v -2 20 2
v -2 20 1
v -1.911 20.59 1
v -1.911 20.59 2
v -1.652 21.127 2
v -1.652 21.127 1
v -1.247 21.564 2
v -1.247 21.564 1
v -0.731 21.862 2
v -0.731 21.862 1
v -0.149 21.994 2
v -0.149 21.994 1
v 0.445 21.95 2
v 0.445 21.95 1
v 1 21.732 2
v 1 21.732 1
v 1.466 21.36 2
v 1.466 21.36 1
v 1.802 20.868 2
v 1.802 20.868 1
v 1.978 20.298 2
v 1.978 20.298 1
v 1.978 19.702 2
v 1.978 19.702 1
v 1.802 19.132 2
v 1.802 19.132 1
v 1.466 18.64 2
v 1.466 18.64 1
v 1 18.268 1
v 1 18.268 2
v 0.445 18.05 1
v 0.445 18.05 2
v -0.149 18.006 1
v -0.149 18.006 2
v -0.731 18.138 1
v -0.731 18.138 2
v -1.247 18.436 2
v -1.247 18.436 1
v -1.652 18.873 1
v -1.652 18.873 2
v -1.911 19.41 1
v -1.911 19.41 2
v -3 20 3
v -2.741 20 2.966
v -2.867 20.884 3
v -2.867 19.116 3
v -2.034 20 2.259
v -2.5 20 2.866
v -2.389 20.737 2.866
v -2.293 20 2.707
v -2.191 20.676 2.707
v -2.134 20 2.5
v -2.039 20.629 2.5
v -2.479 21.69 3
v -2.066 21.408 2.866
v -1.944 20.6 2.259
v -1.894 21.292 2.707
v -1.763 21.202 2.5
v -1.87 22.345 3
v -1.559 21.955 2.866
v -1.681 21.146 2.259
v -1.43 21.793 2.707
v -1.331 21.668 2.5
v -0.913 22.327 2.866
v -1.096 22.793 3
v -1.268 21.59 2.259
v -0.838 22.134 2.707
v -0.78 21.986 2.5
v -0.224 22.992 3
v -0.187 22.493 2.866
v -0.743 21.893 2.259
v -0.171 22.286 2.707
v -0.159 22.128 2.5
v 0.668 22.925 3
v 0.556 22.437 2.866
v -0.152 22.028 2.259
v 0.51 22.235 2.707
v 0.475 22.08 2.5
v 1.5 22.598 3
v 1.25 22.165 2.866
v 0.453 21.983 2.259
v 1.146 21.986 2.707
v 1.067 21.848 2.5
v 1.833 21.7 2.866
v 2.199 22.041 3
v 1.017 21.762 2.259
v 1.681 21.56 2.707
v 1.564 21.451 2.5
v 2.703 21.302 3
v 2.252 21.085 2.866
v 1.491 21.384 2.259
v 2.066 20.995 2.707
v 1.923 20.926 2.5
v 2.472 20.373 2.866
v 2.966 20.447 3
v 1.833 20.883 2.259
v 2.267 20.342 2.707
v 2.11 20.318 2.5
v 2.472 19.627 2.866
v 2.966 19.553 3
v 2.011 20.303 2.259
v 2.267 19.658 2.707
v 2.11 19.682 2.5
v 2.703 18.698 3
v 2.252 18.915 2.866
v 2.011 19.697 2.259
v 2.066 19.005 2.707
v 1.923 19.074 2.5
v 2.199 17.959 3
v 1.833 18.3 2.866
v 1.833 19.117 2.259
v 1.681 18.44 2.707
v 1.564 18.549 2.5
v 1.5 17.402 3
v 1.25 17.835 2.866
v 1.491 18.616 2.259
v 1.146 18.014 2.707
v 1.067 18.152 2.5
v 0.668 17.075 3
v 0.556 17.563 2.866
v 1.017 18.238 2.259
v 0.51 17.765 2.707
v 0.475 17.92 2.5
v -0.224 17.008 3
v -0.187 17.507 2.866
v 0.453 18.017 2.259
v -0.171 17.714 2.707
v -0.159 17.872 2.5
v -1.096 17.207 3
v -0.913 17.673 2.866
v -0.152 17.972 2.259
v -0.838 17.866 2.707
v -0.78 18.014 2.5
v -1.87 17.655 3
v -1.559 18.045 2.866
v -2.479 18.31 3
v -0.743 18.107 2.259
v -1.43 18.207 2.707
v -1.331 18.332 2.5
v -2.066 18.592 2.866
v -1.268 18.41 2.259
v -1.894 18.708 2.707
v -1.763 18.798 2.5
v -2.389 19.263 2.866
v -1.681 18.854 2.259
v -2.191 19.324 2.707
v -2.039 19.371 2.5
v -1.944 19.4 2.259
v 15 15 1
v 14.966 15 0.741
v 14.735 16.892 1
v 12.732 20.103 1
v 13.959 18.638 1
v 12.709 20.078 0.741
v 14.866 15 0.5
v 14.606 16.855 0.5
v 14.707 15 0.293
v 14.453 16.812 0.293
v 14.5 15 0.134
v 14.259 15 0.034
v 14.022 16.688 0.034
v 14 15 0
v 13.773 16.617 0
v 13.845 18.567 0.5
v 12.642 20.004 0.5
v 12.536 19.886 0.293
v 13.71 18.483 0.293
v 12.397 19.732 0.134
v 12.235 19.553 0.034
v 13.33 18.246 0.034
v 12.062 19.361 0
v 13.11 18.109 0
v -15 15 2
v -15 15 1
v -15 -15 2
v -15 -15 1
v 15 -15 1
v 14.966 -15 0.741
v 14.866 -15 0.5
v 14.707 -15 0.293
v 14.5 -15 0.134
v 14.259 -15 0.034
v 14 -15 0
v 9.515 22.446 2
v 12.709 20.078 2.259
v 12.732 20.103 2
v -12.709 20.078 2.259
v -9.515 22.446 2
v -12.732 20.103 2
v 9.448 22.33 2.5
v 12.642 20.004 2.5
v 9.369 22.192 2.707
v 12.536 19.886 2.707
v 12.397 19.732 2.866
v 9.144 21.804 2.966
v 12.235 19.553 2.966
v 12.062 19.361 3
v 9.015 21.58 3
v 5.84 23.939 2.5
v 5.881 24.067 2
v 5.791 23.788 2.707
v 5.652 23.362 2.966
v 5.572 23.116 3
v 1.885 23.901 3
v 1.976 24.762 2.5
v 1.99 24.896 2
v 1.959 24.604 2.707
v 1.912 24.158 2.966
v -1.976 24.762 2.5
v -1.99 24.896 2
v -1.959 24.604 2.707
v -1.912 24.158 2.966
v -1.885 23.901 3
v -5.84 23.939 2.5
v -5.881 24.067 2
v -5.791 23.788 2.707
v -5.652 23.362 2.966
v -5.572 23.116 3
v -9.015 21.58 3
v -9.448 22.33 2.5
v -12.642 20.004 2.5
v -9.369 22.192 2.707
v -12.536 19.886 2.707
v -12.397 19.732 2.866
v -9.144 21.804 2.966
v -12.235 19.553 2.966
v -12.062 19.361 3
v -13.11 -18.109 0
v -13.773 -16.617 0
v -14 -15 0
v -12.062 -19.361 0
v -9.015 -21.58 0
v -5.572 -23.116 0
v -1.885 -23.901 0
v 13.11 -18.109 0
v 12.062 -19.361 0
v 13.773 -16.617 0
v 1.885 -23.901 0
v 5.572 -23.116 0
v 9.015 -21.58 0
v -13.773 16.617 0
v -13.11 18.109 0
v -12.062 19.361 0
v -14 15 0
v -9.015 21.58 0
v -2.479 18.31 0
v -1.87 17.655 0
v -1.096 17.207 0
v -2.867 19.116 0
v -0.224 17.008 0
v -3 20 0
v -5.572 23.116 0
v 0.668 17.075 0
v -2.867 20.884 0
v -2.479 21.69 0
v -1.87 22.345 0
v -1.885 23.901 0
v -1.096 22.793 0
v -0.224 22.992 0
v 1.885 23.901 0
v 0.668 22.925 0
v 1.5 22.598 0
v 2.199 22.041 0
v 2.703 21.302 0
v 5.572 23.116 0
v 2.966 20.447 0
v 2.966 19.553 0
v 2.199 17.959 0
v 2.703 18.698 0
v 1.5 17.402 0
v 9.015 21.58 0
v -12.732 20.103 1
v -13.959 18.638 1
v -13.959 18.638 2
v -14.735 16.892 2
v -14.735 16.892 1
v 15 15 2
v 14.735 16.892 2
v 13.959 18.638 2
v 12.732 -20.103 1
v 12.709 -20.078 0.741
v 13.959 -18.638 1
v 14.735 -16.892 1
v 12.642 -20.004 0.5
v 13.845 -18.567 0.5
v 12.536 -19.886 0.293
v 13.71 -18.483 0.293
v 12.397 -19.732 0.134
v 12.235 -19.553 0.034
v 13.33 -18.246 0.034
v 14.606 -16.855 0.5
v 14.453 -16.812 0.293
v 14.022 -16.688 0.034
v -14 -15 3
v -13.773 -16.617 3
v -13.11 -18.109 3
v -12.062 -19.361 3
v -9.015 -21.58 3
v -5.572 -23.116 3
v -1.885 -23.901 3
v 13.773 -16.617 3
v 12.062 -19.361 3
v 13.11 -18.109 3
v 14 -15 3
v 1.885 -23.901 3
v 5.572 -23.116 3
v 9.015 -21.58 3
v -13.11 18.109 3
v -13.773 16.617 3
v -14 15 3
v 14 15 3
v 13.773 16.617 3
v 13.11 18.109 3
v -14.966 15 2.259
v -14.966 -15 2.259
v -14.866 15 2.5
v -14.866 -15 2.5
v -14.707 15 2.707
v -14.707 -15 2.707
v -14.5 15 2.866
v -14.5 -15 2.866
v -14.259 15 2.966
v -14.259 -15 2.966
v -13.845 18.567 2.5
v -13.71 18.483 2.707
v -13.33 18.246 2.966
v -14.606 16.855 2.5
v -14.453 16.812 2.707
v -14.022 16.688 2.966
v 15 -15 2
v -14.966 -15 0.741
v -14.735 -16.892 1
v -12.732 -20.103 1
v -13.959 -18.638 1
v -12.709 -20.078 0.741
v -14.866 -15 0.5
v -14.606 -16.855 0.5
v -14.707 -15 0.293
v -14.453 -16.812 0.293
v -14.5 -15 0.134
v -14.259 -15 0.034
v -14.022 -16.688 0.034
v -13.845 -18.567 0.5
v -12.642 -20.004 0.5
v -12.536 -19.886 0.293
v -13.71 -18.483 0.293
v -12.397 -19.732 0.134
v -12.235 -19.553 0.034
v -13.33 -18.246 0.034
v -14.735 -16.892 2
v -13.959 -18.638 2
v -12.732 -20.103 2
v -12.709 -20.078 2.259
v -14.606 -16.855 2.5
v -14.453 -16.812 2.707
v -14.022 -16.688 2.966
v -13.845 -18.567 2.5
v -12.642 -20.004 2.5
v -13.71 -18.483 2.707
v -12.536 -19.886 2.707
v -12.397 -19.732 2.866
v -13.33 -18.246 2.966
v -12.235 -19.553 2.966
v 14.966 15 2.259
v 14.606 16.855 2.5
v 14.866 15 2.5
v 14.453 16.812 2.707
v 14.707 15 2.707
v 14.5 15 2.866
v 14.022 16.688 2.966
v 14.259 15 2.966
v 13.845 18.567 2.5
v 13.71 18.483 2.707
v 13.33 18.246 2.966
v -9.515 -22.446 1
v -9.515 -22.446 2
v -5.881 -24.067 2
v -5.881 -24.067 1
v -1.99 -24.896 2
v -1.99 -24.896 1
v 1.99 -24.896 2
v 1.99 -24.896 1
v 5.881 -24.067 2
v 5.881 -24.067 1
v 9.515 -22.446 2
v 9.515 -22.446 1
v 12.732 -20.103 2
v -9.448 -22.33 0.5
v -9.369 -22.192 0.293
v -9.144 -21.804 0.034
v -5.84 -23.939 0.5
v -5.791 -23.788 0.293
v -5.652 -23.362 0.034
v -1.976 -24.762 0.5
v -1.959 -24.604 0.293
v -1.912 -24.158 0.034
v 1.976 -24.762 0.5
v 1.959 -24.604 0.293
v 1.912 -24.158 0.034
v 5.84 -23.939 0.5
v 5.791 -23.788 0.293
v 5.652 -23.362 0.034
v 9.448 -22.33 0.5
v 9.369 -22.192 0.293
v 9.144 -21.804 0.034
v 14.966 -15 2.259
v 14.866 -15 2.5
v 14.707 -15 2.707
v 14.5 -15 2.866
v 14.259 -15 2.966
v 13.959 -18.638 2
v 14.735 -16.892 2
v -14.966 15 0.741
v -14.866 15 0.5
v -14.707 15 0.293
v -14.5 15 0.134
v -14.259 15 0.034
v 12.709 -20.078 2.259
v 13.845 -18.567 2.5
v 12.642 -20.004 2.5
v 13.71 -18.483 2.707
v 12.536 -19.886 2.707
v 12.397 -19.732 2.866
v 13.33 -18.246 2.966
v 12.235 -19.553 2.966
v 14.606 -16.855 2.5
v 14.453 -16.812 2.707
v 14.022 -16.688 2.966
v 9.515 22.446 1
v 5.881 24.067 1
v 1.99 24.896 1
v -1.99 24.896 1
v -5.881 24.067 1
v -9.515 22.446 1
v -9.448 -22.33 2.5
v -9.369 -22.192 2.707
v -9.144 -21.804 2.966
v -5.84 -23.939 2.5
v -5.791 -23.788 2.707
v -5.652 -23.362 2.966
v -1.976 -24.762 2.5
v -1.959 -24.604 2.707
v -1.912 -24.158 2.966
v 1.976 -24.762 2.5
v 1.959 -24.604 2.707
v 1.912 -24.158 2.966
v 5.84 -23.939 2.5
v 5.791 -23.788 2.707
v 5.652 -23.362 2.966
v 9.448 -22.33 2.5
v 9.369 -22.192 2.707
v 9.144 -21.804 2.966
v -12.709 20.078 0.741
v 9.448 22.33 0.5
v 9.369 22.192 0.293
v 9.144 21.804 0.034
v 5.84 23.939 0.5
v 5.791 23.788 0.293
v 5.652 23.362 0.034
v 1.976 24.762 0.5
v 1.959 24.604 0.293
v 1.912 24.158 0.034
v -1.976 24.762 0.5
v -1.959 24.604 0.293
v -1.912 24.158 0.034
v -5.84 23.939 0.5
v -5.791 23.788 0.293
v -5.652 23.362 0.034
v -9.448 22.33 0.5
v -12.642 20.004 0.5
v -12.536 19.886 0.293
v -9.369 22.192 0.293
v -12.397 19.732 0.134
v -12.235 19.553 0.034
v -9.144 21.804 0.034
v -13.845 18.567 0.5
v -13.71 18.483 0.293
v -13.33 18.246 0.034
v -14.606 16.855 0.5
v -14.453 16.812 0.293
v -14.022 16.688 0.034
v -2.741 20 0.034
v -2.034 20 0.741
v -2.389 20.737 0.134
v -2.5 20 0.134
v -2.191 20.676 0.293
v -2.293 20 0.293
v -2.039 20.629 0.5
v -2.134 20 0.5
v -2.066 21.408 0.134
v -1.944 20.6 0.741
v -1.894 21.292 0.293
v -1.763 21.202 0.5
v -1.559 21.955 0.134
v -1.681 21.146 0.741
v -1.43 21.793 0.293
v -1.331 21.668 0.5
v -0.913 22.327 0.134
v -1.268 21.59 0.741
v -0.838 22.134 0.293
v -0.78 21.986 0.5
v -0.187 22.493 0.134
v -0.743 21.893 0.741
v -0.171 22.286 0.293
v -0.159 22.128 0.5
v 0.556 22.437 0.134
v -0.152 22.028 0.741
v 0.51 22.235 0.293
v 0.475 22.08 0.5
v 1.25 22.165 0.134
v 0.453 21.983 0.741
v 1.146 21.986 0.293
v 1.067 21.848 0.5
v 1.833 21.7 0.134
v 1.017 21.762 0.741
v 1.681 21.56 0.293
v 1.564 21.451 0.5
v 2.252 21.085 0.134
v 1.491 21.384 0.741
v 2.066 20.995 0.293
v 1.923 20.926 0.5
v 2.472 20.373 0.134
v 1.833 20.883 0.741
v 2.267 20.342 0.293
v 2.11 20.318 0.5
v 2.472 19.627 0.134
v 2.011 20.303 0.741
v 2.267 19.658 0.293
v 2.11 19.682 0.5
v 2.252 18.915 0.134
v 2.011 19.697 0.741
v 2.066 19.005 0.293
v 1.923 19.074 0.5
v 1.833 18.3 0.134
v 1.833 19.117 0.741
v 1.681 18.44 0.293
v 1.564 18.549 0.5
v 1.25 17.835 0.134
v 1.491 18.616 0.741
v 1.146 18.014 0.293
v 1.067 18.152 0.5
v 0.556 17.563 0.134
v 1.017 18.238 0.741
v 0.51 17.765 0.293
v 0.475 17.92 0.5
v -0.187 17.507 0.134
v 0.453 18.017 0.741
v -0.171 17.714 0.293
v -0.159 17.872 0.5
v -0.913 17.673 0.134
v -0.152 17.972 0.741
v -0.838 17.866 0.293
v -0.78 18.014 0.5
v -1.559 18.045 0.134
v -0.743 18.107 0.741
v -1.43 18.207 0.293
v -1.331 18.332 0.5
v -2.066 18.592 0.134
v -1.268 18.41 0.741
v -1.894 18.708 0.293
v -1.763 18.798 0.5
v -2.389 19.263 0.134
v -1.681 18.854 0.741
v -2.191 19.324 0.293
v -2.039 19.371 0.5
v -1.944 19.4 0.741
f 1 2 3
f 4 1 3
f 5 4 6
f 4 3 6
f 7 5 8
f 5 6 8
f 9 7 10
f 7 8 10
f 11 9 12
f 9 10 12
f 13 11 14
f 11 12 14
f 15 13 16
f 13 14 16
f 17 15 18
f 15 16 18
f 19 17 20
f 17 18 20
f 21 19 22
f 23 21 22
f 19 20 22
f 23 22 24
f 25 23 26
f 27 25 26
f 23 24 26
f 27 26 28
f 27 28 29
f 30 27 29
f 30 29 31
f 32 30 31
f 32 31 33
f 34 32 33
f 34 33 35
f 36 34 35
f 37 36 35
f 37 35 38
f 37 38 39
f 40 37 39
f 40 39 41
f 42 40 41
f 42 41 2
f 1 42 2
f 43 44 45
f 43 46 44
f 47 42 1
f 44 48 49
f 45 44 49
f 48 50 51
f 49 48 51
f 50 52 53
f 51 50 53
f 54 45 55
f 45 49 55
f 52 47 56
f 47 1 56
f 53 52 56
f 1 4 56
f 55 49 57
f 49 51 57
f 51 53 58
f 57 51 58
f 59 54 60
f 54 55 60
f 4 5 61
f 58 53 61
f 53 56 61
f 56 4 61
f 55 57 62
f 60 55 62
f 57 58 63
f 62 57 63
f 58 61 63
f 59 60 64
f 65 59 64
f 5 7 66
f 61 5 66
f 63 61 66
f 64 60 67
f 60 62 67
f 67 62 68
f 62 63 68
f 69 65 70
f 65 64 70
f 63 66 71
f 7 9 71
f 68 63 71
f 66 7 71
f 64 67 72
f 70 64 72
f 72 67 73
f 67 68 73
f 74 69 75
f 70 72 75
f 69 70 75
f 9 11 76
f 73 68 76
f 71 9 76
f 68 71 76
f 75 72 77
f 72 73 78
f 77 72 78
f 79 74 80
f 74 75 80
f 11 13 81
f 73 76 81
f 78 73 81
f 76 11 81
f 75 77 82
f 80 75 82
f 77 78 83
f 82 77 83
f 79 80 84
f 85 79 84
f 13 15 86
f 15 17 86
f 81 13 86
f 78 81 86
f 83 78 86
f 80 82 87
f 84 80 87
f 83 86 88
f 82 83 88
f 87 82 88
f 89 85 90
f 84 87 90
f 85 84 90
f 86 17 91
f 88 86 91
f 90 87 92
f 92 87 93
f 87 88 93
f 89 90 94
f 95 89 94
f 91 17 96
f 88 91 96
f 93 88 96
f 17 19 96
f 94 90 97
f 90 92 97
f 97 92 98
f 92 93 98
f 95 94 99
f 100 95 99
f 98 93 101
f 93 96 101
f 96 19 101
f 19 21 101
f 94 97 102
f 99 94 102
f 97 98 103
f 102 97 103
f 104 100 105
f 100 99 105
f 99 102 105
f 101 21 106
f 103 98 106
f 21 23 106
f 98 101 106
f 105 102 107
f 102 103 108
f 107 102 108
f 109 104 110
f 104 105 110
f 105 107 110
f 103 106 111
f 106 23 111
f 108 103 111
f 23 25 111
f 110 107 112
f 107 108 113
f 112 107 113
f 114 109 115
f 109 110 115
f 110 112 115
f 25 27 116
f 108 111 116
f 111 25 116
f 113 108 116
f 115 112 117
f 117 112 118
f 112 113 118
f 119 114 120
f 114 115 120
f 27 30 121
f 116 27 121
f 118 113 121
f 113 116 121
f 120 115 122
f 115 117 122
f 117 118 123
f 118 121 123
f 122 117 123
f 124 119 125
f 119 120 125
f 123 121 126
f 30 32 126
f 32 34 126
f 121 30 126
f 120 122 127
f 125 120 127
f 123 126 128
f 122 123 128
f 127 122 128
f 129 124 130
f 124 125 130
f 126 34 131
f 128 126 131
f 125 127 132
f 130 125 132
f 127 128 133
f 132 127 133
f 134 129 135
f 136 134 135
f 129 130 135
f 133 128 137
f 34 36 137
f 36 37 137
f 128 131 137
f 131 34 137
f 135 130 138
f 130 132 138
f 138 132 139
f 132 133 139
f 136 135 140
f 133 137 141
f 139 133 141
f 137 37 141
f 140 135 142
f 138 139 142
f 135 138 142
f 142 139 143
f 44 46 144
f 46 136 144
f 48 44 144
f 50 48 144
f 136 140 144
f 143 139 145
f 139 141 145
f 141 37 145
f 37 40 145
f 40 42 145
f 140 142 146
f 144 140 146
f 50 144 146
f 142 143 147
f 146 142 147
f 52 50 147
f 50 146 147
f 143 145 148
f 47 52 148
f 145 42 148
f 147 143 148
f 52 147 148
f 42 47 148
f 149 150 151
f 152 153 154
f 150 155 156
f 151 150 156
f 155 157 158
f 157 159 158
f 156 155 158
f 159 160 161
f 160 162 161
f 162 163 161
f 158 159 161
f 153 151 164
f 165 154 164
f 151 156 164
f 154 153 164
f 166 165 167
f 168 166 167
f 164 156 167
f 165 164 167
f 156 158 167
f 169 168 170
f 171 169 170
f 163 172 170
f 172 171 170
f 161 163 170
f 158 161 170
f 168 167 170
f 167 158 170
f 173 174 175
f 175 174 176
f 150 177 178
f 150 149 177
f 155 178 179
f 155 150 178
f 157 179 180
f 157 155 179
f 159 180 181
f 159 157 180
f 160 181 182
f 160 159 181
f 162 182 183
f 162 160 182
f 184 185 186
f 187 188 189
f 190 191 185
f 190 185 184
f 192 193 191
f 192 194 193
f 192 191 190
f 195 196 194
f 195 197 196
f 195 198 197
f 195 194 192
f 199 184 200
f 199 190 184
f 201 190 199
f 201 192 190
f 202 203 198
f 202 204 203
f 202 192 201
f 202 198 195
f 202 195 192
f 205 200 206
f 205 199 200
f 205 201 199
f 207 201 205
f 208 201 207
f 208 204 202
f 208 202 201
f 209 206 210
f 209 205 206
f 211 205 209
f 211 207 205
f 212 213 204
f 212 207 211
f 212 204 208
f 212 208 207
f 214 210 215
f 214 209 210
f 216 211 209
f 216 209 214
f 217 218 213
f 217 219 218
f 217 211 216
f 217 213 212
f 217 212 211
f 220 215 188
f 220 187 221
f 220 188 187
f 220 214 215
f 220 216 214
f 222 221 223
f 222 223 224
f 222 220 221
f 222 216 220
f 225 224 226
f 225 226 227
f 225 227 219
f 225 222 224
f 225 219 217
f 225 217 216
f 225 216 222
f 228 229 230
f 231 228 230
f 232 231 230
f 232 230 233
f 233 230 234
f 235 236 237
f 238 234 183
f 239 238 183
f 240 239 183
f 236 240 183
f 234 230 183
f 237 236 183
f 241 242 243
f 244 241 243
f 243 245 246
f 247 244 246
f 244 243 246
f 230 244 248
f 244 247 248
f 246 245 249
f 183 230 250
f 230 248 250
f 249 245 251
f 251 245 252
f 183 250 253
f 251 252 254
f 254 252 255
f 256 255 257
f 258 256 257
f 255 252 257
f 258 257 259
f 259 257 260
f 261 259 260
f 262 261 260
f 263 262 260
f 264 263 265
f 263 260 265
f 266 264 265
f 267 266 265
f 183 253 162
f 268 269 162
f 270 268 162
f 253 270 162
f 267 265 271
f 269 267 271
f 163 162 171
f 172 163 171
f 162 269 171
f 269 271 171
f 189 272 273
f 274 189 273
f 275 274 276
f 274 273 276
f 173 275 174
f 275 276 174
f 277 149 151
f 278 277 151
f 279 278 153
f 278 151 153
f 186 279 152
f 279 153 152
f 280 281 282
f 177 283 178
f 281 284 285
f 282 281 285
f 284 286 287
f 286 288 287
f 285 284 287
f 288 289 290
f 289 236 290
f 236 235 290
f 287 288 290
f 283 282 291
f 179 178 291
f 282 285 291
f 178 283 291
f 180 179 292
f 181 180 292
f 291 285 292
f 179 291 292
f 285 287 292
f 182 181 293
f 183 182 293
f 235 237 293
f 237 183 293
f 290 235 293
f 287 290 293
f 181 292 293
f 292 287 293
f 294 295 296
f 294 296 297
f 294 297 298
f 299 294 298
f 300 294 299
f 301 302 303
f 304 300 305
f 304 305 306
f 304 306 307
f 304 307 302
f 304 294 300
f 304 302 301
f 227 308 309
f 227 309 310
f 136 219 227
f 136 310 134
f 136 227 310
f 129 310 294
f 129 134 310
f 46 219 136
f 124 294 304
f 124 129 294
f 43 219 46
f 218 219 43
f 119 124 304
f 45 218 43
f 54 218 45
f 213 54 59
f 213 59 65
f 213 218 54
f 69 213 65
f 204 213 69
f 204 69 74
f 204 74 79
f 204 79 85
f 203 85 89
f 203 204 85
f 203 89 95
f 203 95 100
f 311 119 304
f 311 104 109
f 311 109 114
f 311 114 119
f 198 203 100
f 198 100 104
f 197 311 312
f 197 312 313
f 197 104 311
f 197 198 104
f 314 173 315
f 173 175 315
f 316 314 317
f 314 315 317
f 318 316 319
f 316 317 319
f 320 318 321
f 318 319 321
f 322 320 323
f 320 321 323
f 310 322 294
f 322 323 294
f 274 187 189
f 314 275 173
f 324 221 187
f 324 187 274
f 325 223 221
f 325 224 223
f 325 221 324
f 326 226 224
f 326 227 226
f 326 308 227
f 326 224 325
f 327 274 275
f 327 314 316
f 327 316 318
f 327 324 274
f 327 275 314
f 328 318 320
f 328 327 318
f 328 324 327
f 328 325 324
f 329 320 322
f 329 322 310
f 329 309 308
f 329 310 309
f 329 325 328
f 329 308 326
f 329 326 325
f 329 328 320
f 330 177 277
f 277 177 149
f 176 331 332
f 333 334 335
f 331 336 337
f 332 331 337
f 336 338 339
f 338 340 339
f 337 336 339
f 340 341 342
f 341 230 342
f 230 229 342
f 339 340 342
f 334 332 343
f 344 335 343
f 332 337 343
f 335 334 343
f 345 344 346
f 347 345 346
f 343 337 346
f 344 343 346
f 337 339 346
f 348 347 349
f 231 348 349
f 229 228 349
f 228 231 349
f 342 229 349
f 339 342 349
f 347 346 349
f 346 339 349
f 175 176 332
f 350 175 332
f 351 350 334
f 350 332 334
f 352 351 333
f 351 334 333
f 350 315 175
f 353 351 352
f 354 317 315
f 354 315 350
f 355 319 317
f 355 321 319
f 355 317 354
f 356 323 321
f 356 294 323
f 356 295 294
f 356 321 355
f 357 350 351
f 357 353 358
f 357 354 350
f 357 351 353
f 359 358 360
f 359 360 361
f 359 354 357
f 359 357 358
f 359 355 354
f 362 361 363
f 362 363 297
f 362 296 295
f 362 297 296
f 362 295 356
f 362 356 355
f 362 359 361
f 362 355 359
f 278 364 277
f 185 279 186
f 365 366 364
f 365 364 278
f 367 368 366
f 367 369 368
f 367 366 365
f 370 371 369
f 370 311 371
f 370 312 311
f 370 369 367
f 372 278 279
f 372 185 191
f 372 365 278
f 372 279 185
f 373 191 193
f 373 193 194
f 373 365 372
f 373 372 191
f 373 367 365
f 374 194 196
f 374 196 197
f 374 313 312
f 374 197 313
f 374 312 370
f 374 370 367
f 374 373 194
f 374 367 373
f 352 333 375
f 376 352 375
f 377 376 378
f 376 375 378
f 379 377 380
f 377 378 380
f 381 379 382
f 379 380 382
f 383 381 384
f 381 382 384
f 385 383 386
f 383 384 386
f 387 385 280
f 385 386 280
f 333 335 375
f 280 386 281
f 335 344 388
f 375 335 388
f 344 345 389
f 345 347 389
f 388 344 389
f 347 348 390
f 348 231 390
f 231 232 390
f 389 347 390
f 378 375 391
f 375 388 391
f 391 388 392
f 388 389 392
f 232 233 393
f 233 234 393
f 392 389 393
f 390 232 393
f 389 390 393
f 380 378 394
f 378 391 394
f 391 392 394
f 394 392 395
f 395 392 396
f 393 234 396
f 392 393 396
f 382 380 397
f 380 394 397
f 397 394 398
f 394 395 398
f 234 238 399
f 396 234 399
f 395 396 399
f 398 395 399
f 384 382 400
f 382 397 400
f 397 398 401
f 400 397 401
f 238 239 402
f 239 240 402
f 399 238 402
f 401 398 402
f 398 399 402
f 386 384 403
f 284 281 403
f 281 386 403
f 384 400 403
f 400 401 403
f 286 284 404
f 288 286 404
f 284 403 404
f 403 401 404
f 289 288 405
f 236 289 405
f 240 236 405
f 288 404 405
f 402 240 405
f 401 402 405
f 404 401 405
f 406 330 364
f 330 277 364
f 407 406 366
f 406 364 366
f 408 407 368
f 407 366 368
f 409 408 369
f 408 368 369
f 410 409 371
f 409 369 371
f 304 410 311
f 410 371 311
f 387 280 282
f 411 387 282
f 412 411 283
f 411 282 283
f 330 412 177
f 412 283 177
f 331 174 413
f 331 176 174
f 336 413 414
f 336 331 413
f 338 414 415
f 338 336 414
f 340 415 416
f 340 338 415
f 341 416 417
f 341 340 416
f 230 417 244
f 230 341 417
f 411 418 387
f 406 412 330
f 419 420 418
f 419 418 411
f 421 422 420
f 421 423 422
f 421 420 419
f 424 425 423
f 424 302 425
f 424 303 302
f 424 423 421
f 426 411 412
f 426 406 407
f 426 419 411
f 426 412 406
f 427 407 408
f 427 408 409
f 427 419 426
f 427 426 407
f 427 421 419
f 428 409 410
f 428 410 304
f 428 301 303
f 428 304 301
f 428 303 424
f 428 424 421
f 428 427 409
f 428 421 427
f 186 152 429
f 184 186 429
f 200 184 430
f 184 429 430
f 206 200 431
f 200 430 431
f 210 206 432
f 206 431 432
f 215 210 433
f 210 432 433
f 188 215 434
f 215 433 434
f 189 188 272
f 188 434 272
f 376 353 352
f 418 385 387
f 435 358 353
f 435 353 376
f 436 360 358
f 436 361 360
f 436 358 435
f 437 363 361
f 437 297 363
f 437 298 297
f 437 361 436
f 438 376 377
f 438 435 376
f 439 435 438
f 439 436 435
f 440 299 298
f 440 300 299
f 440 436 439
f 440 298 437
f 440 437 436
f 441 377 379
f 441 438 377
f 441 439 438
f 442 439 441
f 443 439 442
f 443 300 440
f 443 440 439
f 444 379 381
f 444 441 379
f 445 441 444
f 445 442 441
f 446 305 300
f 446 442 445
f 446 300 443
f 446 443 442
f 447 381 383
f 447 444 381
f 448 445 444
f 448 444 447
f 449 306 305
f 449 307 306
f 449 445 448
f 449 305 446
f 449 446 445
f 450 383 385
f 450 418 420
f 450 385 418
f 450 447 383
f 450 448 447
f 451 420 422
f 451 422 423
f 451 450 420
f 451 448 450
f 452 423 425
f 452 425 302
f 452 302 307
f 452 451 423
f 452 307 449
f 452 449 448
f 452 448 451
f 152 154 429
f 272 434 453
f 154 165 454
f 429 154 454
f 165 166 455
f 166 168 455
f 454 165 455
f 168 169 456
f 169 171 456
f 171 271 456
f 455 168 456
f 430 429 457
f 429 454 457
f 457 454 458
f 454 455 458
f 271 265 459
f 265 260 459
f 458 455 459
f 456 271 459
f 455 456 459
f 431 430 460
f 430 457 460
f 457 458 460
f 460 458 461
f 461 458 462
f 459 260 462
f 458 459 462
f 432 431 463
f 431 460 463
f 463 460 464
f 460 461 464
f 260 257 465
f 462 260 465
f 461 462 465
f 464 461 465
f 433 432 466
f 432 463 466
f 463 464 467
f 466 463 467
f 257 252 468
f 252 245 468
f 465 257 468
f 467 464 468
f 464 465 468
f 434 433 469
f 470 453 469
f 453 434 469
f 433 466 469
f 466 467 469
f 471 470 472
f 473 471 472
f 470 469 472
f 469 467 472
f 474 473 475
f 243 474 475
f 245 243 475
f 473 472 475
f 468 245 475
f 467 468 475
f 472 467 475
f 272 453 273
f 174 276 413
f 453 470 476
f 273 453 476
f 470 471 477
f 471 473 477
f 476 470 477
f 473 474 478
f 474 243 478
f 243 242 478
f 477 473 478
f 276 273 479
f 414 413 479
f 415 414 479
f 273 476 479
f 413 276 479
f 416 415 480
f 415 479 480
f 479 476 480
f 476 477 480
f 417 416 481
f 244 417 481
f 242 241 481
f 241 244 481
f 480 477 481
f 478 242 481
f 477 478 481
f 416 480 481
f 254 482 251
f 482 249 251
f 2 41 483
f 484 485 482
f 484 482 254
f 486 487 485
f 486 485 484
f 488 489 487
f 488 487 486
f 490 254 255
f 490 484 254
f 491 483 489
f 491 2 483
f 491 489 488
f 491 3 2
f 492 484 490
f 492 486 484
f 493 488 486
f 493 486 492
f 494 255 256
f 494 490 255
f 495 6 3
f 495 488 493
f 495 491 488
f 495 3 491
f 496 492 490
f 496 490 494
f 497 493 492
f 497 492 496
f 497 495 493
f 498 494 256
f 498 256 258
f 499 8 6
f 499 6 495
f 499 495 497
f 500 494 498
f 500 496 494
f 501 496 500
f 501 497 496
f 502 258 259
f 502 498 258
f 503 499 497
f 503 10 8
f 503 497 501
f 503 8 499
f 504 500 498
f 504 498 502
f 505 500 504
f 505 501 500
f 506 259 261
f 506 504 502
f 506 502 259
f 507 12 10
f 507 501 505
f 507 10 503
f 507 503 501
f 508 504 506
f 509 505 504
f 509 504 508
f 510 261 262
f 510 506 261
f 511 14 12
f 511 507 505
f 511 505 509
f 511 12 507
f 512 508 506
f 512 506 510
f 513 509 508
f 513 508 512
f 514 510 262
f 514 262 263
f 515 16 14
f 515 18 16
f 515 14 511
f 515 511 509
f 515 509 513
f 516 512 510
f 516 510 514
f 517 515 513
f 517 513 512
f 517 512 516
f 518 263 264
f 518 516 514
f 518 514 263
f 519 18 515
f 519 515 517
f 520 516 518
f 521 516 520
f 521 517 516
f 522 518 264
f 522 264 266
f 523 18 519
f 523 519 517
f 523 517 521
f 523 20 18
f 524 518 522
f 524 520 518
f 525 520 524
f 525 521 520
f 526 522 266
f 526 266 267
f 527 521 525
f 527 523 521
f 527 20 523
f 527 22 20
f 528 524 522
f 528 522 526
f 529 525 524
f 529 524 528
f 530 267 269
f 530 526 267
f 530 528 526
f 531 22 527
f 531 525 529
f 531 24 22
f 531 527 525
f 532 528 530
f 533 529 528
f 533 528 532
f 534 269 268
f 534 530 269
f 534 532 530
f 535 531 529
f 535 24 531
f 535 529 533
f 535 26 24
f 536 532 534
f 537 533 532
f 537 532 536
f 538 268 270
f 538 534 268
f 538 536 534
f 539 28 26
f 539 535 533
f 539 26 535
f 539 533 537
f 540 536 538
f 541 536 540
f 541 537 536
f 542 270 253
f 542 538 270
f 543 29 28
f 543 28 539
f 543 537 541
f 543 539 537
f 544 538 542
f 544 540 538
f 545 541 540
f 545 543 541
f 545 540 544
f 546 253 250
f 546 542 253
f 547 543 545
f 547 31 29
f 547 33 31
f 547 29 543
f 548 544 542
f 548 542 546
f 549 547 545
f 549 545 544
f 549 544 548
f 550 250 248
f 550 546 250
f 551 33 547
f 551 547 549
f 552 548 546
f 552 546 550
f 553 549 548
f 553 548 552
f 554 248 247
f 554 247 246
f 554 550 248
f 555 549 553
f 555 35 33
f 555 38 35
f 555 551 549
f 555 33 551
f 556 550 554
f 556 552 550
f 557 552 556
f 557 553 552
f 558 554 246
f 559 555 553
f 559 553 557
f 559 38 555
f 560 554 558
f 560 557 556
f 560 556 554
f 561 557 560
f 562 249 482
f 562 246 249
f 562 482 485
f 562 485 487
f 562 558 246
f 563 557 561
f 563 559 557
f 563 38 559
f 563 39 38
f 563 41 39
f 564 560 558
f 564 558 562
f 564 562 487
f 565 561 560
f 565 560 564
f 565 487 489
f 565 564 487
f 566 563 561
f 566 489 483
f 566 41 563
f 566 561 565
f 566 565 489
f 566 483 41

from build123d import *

# Parameters (mm, degrees)
F1_DEPTH = 3
F3_D     = 4
F4_R     = 1


# Not quite as in the source:
# - ends of sketch curves that miss each other by under 0.0002 mm in the source are joined


with BuildPart() as f1:
    # F0 (on Top) → F1 (new body)
    with BuildSketch(Plane.XY):
        with BuildLine():
            Line((15, -15), (15, 15.0000007931))
            ThreePointArc((15, 15.0000007931), (14.4074542357, 17.7922023165), (12.7319587629, 20.1030927835))
            ThreePointArc((12.7319587629, 20.1030927835), (0, 25), (-12.7319587629, 20.1030927835))
            ThreePointArc((-12.7319587629, 20.1030927835), (-14.4074543968, 17.7922019541), (-15, 15))
            Line((-15, 15), (-15, -15.0000007931))
            ThreePointArc((-15, -15.0000007931), (-14.4074543968, -17.7922019541), (-12.7319587629, -20.1030927835))
            ThreePointArc((-12.7319587629, -20.1030927835), (0, -25), (12.7319587629, -20.1030927835))
            ThreePointArc((12.7319587629, -20.1030927835), (14.4074542357, -17.7922023165), (15, -15))
        make_face()
    extrude(amount=F1_DEPTH)

    # F3 (through all)
    with Locations(Plane.XY.offset(3)):
        with Locations((0, 20)):
            Hole(F3_D / 2)

    # F4
    f4_edges = [f1.edges().sort_by_distance(p)[0] for p in [
        (14.407454, -17.792202, 3),
        (0, -25, 3),
        (15, 0, 3),
        (-14.407454, -17.792202, 3),
        (14.407454, 17.792202, 3),
        (-15, 0, 3),
        (0, 25, 3),
        (-14.407454, 17.792202, 3),
        (-2, 20, 3),
        (14.407454, -17.792202, 0),
        (0, -25, 0),
        (15, 0, 0),
        (-14.407454, -17.792202, 0),
        (14.407454, 17.792202, 0),
        (-15, 0, 0),
        (0, 25, 0),
        (-14.407454, 17.792202, 0),
        (-2, 20, 0),
    ]]
    fillet(f4_edges, radius=F4_R)


solid = f1.part
